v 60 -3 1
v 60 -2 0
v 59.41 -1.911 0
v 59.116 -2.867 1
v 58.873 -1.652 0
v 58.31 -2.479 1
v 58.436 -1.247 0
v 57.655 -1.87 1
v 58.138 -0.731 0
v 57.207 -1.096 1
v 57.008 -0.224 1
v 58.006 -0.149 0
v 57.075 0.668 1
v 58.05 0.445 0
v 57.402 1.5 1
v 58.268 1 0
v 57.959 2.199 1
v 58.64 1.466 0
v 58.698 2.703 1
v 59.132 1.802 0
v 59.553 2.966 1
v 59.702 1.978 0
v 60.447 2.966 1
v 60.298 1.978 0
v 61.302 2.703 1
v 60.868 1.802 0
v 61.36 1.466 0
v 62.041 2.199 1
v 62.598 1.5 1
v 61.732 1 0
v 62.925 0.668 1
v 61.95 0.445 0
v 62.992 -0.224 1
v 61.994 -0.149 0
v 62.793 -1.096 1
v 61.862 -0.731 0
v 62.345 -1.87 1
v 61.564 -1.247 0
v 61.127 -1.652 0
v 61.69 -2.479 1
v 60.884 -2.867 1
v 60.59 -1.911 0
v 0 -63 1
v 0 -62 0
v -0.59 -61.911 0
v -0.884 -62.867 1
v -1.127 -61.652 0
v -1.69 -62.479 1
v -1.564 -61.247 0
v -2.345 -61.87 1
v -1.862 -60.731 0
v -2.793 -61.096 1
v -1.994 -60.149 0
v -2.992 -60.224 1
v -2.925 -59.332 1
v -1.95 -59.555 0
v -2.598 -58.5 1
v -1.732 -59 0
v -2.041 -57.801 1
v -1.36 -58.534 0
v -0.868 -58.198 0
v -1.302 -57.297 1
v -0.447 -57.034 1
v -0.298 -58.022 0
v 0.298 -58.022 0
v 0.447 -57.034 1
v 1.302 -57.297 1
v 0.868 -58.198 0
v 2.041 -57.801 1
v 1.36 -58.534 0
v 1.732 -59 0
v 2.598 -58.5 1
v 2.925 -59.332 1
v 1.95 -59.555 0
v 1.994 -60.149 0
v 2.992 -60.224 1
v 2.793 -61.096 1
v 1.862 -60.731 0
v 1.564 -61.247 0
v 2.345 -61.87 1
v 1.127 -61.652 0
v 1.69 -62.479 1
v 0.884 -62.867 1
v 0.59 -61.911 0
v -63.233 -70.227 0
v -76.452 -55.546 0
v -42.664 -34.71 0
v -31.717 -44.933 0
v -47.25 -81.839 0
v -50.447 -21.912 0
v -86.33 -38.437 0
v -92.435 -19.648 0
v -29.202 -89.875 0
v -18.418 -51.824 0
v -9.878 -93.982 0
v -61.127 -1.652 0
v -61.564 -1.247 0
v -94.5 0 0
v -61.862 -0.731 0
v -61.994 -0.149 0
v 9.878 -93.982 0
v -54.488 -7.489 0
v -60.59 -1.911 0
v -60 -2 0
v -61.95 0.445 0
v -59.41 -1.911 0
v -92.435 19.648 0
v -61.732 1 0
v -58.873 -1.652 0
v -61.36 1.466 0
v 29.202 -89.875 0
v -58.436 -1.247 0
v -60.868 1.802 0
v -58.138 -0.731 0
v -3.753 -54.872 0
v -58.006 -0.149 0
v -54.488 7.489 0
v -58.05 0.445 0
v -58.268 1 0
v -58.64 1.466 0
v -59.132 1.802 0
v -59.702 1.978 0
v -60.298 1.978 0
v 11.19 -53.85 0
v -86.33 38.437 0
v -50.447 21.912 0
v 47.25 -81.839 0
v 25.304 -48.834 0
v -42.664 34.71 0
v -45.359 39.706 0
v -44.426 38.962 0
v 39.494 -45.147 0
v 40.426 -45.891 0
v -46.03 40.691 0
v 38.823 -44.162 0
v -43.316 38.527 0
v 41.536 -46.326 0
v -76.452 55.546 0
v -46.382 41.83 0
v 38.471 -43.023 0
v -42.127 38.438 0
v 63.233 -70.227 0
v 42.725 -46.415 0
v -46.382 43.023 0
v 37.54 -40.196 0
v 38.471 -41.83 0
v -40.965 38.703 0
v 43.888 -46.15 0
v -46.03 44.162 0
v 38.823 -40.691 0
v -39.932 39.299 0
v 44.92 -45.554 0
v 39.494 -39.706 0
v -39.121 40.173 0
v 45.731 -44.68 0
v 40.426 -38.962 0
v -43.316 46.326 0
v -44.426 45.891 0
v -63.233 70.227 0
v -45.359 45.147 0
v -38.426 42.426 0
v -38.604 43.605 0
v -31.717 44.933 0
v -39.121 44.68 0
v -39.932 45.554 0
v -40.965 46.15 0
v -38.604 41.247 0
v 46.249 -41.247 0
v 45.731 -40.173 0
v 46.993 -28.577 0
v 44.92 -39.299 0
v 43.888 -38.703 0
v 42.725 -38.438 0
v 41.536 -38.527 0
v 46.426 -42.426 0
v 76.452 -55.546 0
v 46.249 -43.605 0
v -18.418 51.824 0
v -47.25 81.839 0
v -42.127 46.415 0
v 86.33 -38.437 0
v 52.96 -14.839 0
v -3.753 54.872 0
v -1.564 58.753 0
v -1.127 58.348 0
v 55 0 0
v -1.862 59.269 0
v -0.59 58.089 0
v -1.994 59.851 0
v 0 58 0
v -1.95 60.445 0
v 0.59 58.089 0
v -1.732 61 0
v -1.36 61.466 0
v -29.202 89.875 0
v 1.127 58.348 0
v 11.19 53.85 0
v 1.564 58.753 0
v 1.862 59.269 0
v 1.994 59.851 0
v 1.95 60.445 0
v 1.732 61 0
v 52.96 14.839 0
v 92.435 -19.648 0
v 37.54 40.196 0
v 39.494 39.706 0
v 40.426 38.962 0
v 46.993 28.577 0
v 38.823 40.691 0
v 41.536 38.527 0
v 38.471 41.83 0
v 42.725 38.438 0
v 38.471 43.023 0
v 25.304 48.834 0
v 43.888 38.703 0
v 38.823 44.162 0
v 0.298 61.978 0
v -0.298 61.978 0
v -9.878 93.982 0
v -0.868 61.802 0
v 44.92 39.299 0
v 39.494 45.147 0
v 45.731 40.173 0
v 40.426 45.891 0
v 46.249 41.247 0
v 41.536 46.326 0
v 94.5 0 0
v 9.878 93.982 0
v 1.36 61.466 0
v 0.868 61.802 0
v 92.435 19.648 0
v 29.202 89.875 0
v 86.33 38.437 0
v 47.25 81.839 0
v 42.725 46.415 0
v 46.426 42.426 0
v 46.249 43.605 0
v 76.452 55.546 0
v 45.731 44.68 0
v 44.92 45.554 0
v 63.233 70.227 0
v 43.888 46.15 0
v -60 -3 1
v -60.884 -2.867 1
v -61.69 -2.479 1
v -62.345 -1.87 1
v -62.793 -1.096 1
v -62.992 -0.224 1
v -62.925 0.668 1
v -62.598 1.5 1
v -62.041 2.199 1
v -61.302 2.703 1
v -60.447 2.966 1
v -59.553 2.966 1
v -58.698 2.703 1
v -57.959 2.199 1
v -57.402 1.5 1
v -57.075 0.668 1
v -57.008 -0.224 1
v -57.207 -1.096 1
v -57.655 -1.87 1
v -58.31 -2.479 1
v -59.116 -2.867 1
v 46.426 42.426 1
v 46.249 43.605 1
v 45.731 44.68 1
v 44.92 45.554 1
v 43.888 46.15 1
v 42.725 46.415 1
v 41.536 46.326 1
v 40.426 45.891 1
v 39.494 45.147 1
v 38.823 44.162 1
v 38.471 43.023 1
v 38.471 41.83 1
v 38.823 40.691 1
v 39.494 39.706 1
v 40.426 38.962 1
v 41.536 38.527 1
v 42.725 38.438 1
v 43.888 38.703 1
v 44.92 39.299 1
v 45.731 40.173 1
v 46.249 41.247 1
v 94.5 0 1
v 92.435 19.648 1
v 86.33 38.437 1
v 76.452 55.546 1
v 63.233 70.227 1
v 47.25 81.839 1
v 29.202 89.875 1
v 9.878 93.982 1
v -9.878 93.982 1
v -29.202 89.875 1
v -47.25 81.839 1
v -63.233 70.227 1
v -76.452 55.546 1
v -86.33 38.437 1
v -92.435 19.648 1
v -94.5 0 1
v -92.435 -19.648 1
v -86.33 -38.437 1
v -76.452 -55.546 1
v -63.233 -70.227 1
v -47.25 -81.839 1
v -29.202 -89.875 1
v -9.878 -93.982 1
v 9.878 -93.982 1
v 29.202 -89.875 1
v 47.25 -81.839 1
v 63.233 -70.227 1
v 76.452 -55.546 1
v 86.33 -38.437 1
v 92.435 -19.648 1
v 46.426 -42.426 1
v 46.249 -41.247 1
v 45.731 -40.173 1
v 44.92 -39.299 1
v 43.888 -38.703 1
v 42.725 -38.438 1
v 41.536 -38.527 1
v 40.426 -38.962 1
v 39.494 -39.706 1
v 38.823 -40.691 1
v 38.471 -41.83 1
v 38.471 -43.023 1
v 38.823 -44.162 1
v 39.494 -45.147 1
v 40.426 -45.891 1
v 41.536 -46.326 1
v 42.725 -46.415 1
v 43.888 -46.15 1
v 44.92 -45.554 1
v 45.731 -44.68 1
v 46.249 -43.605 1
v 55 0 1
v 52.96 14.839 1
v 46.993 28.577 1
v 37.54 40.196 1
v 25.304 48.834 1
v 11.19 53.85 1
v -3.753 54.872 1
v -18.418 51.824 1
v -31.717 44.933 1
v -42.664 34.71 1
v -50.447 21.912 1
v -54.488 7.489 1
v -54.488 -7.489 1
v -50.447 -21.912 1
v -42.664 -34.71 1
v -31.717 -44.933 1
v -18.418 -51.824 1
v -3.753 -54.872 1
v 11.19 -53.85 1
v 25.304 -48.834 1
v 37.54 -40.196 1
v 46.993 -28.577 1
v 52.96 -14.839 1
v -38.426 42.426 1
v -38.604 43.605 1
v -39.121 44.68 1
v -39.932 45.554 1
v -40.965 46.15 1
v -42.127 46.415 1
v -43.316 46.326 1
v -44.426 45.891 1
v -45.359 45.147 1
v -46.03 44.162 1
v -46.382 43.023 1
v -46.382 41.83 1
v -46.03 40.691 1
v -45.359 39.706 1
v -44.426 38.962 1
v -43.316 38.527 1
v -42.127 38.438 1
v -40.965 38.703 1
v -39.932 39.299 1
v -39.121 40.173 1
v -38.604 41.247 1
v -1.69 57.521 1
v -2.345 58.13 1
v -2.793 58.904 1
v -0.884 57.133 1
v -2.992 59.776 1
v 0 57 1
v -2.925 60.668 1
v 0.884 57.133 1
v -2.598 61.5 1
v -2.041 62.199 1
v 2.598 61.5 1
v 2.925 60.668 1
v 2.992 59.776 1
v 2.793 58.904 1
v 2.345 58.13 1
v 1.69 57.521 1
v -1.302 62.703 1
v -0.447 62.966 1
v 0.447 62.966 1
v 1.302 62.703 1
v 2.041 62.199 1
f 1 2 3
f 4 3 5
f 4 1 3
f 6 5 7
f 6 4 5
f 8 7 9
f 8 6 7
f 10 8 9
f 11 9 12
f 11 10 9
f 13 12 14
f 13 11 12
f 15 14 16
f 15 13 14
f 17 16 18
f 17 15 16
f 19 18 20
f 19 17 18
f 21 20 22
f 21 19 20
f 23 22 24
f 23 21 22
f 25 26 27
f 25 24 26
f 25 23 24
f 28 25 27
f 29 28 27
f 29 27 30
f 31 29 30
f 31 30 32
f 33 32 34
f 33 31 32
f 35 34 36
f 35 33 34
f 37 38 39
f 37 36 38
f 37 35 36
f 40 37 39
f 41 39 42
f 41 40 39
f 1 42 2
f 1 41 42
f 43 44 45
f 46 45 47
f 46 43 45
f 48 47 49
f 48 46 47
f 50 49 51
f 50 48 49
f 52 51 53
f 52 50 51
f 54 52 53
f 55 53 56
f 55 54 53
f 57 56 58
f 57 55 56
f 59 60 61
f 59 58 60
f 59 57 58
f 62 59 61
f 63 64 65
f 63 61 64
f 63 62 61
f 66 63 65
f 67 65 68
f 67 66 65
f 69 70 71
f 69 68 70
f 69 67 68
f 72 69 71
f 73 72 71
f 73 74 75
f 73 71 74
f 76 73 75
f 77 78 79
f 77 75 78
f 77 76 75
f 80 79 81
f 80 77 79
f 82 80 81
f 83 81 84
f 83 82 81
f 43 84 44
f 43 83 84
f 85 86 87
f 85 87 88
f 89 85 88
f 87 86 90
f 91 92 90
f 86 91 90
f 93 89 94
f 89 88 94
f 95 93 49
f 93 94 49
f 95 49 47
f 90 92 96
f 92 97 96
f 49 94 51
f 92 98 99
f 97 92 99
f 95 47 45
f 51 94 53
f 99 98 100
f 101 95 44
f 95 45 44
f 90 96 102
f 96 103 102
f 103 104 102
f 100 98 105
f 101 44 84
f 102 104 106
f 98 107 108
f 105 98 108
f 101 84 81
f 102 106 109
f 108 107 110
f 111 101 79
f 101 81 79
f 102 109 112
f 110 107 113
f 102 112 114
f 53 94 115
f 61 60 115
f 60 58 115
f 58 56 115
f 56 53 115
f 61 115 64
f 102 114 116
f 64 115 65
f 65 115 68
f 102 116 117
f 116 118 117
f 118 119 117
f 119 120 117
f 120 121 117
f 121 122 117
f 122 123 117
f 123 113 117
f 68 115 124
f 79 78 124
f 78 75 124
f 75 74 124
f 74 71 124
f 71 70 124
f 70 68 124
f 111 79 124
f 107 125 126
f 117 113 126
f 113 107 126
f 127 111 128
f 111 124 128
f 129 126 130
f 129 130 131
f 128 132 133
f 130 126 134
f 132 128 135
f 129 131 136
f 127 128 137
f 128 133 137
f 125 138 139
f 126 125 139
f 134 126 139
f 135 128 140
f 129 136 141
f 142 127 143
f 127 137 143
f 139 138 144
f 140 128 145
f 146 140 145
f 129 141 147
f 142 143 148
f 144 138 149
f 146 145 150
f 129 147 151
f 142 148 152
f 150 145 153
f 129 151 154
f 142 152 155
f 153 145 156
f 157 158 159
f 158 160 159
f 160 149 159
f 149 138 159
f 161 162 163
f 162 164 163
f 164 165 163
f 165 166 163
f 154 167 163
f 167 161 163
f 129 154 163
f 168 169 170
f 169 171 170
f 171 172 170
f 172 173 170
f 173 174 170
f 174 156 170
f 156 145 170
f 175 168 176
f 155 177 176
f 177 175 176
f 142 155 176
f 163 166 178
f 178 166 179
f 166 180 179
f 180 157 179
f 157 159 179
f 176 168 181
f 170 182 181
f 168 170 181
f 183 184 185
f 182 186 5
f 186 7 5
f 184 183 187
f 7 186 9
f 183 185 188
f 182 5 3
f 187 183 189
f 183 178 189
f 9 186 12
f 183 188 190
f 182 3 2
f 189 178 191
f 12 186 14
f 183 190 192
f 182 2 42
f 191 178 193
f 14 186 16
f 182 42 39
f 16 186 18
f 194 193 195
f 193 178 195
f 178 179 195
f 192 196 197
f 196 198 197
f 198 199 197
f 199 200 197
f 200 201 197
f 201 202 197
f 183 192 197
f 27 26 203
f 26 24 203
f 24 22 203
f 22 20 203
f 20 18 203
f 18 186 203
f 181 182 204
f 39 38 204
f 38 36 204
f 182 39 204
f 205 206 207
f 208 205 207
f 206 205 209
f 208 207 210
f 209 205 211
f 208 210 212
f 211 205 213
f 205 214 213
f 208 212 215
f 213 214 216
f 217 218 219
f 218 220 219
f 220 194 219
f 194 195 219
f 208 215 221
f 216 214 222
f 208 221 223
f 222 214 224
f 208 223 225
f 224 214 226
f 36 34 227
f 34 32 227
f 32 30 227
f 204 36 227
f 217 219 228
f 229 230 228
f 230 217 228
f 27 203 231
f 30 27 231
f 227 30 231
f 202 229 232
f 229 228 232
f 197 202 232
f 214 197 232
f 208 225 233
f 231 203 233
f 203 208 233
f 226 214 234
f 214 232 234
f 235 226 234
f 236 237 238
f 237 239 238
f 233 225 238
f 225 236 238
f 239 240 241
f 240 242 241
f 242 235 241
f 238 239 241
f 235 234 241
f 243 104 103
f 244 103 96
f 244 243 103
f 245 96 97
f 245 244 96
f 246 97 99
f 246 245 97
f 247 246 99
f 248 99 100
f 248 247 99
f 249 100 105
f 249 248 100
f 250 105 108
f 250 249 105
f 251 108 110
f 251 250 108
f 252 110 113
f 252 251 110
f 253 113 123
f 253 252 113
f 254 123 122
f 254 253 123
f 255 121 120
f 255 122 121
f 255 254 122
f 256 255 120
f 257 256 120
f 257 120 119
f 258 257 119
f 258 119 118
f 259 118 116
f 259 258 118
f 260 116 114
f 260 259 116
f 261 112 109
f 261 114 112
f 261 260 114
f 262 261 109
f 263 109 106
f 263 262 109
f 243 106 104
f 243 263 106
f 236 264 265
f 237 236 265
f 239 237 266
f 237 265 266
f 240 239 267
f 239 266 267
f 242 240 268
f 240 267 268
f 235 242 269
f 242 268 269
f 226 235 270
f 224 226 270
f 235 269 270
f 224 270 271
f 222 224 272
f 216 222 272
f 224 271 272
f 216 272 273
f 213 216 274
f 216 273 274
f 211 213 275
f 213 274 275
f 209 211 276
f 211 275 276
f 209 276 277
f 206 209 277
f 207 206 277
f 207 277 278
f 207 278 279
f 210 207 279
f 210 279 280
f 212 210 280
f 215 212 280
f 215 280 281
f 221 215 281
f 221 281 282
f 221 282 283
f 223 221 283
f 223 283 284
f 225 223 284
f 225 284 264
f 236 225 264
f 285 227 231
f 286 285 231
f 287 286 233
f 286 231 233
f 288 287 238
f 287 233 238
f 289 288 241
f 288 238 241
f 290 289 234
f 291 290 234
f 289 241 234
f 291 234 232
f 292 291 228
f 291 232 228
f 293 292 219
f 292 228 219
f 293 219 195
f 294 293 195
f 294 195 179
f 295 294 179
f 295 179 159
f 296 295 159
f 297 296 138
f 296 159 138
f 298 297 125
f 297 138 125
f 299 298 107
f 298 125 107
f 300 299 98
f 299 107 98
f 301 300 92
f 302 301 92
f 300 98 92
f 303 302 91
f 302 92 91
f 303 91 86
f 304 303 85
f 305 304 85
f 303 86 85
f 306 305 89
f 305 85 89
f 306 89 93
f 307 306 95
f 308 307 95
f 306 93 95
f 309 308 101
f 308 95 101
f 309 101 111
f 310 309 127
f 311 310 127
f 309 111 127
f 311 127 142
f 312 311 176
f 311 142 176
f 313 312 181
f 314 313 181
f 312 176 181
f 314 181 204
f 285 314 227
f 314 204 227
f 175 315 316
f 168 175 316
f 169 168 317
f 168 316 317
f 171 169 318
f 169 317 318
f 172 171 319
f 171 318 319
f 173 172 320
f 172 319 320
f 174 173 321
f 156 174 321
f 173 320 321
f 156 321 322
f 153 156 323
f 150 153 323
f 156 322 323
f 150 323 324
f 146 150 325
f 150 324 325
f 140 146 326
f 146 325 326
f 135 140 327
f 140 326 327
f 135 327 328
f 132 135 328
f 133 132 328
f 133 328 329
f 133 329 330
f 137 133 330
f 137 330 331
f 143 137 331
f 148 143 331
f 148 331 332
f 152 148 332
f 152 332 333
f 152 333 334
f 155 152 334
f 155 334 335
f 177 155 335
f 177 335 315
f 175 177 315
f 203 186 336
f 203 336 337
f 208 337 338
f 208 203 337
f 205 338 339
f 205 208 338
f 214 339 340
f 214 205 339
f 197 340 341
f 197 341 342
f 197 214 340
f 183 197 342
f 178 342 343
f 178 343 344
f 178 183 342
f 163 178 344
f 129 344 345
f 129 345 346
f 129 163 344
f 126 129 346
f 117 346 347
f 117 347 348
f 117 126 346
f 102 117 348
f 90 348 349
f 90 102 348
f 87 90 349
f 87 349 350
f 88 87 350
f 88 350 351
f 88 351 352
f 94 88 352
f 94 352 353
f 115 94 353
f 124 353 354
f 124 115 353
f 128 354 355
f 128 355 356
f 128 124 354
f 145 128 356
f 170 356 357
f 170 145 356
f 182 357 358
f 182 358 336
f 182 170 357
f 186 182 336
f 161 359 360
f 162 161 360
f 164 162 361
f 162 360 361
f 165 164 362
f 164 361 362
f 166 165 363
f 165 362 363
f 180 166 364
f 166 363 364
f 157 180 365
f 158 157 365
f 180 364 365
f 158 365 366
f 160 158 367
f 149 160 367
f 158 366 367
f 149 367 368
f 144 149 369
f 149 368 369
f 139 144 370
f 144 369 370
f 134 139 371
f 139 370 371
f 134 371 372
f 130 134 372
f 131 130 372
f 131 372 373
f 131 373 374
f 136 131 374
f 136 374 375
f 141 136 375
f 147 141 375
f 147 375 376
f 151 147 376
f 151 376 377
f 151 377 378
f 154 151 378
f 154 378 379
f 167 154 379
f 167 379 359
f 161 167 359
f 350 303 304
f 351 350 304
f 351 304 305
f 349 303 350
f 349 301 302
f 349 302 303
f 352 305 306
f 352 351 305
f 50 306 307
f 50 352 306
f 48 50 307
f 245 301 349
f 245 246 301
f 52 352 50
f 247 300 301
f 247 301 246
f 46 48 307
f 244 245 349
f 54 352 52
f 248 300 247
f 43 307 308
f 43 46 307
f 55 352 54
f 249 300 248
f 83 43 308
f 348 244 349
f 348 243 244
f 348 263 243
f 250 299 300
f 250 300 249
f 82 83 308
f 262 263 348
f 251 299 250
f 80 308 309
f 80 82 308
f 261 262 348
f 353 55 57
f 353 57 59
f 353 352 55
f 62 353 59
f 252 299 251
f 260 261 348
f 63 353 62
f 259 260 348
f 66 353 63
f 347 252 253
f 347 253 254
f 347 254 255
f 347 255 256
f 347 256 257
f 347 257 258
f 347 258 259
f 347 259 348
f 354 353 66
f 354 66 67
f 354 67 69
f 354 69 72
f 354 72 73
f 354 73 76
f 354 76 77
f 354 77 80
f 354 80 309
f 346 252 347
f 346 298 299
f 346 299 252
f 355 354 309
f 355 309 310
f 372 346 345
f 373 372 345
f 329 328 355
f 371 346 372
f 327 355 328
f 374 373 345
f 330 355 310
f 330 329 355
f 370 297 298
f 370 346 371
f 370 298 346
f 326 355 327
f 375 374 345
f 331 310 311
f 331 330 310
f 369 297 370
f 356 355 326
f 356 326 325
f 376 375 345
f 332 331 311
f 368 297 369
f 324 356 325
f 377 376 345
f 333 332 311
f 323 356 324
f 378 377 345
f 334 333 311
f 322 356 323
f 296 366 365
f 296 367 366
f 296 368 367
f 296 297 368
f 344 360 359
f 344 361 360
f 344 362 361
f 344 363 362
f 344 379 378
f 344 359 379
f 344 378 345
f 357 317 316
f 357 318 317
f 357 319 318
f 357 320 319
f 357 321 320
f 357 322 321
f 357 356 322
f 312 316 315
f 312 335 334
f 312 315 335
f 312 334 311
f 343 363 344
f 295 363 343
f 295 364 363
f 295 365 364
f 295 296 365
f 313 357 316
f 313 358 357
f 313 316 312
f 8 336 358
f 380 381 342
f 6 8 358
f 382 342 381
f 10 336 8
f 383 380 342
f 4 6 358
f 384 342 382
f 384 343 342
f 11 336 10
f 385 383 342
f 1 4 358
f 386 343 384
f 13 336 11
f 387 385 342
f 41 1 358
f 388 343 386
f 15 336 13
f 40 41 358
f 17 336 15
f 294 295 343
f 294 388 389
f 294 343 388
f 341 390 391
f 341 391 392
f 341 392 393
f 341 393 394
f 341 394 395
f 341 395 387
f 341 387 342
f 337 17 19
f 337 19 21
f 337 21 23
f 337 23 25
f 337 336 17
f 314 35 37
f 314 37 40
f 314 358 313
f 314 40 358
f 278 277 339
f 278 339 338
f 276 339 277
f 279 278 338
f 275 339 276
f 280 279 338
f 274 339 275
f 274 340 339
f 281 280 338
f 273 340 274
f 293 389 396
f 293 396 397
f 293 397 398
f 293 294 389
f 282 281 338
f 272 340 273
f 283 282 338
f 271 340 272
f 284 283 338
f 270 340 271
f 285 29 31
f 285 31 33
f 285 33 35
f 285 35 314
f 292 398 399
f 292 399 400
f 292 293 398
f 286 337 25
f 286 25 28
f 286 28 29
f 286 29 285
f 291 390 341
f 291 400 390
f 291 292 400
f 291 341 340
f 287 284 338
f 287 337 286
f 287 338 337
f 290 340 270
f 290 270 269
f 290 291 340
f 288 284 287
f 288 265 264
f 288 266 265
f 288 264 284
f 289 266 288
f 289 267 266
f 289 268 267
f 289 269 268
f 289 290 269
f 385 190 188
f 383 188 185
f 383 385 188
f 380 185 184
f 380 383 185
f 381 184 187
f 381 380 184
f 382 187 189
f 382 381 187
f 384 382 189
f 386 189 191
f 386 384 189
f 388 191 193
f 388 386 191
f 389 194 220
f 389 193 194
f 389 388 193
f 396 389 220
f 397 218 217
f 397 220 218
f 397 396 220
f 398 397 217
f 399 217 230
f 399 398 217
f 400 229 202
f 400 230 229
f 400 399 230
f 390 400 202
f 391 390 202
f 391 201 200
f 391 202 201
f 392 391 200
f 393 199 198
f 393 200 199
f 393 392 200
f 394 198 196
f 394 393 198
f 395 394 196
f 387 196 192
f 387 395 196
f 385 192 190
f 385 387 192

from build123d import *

# Parameters (mm, degrees)
ESQUISSE1_R                                 = 94.5
ESQUISSE1_R_2                               = 55
BOSS_EXTRU_1_DEPTH                          = 1
ENL_V_MAT_EXTRU_2_REACH                     = 135.647
ESQUISSE2_R                                 = 4
FRAISAGE_POUR_VIS_T_TE_FRAIS_E_M31_AT_COUNT = 2
FRAISAGE_POUR_VIS_T_TE_FRAIS_E_M31_AT_PITCH = 84.852813742
FRAISAGE_POUR_VIS_T_TE_FRAIS_E_M31_2_COUNT  = 2
FRAISAGE_POUR_VIS_T_TE_FRAIS_E_M31_2_PITCH  = 120
FRAISAGE_POUR_VIS_T_TE_FRAIS_E_M31_3_COUNT  = 2
FRAISAGE_POUR_VIS_T_TE_FRAIS_E_M31_3_PITCH  = 84.852813742


with BuildPart() as part:
    # Esquisse1 → Boss.-Extru.1 (new body)
    with BuildSketch(Plane.XY):
        Circle(ESQUISSE1_R)
        Circle(ESQUISSE1_R_2, mode=Mode.SUBTRACT)
    extrude(amount=BOSS_EXTRU_1_DEPTH)

    # Esquisse2 → Enlèv. mat.-Extru.2 (cut, up to next)
    with BuildSketch(Plane.XY.offset(1), mode=Mode.PRIVATE) as enl_v_mat_extru_2_sk1:
        with Locations((42.426406871, 42.426406871)):
            Circle(ESQUISSE2_R)
    enl_v_mat_extru_2_tool1 = extrude(enl_v_mat_extru_2_sk1.sketch, amount=-ENL_V_MAT_EXTRU_2_REACH, mode=Mode.PRIVATE) & part.part
    # Esquisse2 → Enlèv. mat.-Extru.2 (cut, up to next)
    with BuildSketch(Plane.XY.offset(1), mode=Mode.PRIVATE) as enl_v_mat_extru_2_sk2:
        with Locations((-42.426406871, 42.426406871)):
            Circle(ESQUISSE2_R)
    enl_v_mat_extru_2_tool2 = extrude(enl_v_mat_extru_2_sk2.sketch, amount=-ENL_V_MAT_EXTRU_2_REACH, mode=Mode.PRIVATE) & part.part
    # Esquisse2 → Enlèv. mat.-Extru.2 (cut, up to next)
    with BuildSketch(Plane.XY.offset(1), mode=Mode.PRIVATE) as enl_v_mat_extru_2_sk3:
        with Locations((42.426406871, -42.426406871)):
            Circle(ESQUISSE2_R)
    enl_v_mat_extru_2_tool3 = extrude(enl_v_mat_extru_2_sk3.sketch, amount=-ENL_V_MAT_EXTRU_2_REACH, mode=Mode.PRIVATE) & part.part
    add(enl_v_mat_extru_2_tool1.solids().sort_by_distance((42.426407, 42.426407, 1))[0], mode=Mode.SUBTRACT)
    add(enl_v_mat_extru_2_tool2.solids().sort_by_distance((-42.426407, 42.426407, 1))[0], mode=Mode.SUBTRACT)
    add(enl_v_mat_extru_2_tool3.solids().sort_by_distance((42.426407, -42.426407, 1))[0], mode=Mode.SUBTRACT)

    # Esquisse3 → Fraisage pour vis à tête fraisée M31 (revolve, cut)
    with BuildSketch(Plane(origin=(0, 60, 1), x_dir=(0, -1, 0), z_dir=(1, 0, 0))):
        Polygon((0, 0), (0, 1), (1.6, 1), (1.6, 1.4), (3, 0), align=None)
    fraisage_pour_vis_t_te_frais_e_m31 = revolve(axis=Axis((0, 60, 7.35), (0, 0, -1)), mode=Mode.SUBTRACT)

    # Fraisage pour vis à tête fraisée M31 at: Fraisage pour vis à tête fraisée M31 ×2
    with Locations(*[Vector(0.7071067811865476, -0.7071067811865476, 0) * (i * FRAISAGE_POUR_VIS_T_TE_FRAIS_E_M31_AT_PITCH) for i in range(1, FRAISAGE_POUR_VIS_T_TE_FRAIS_E_M31_AT_COUNT)]):
        add(fraisage_pour_vis_t_te_frais_e_m31, mode=Mode.SUBTRACT)

    # Fraisage pour vis _ t_te frais_e M31 2: Fraisage pour vis à tête fraisée M31 ×2
    with Locations(*[(0, -i * FRAISAGE_POUR_VIS_T_TE_FRAIS_E_M31_2_PITCH, 0) for i in range(1, FRAISAGE_POUR_VIS_T_TE_FRAIS_E_M31_2_COUNT)]):
        add(fraisage_pour_vis_t_te_frais_e_m31, mode=Mode.SUBTRACT)

    # Fraisage pour vis _ t_te frais_e M31 3: Fraisage pour vis à tête fraisée M31 ×2
    with Locations(*[Vector(-0.7071067811865476, -0.7071067811865476, 0) * (i * FRAISAGE_POUR_VIS_T_TE_FRAIS_E_M31_3_PITCH) for i in range(1, FRAISAGE_POUR_VIS_T_TE_FRAIS_E_M31_3_COUNT)]):
        add(fraisage_pour_vis_t_te_frais_e_m31, mode=Mode.SUBTRACT)


solid = part.part
